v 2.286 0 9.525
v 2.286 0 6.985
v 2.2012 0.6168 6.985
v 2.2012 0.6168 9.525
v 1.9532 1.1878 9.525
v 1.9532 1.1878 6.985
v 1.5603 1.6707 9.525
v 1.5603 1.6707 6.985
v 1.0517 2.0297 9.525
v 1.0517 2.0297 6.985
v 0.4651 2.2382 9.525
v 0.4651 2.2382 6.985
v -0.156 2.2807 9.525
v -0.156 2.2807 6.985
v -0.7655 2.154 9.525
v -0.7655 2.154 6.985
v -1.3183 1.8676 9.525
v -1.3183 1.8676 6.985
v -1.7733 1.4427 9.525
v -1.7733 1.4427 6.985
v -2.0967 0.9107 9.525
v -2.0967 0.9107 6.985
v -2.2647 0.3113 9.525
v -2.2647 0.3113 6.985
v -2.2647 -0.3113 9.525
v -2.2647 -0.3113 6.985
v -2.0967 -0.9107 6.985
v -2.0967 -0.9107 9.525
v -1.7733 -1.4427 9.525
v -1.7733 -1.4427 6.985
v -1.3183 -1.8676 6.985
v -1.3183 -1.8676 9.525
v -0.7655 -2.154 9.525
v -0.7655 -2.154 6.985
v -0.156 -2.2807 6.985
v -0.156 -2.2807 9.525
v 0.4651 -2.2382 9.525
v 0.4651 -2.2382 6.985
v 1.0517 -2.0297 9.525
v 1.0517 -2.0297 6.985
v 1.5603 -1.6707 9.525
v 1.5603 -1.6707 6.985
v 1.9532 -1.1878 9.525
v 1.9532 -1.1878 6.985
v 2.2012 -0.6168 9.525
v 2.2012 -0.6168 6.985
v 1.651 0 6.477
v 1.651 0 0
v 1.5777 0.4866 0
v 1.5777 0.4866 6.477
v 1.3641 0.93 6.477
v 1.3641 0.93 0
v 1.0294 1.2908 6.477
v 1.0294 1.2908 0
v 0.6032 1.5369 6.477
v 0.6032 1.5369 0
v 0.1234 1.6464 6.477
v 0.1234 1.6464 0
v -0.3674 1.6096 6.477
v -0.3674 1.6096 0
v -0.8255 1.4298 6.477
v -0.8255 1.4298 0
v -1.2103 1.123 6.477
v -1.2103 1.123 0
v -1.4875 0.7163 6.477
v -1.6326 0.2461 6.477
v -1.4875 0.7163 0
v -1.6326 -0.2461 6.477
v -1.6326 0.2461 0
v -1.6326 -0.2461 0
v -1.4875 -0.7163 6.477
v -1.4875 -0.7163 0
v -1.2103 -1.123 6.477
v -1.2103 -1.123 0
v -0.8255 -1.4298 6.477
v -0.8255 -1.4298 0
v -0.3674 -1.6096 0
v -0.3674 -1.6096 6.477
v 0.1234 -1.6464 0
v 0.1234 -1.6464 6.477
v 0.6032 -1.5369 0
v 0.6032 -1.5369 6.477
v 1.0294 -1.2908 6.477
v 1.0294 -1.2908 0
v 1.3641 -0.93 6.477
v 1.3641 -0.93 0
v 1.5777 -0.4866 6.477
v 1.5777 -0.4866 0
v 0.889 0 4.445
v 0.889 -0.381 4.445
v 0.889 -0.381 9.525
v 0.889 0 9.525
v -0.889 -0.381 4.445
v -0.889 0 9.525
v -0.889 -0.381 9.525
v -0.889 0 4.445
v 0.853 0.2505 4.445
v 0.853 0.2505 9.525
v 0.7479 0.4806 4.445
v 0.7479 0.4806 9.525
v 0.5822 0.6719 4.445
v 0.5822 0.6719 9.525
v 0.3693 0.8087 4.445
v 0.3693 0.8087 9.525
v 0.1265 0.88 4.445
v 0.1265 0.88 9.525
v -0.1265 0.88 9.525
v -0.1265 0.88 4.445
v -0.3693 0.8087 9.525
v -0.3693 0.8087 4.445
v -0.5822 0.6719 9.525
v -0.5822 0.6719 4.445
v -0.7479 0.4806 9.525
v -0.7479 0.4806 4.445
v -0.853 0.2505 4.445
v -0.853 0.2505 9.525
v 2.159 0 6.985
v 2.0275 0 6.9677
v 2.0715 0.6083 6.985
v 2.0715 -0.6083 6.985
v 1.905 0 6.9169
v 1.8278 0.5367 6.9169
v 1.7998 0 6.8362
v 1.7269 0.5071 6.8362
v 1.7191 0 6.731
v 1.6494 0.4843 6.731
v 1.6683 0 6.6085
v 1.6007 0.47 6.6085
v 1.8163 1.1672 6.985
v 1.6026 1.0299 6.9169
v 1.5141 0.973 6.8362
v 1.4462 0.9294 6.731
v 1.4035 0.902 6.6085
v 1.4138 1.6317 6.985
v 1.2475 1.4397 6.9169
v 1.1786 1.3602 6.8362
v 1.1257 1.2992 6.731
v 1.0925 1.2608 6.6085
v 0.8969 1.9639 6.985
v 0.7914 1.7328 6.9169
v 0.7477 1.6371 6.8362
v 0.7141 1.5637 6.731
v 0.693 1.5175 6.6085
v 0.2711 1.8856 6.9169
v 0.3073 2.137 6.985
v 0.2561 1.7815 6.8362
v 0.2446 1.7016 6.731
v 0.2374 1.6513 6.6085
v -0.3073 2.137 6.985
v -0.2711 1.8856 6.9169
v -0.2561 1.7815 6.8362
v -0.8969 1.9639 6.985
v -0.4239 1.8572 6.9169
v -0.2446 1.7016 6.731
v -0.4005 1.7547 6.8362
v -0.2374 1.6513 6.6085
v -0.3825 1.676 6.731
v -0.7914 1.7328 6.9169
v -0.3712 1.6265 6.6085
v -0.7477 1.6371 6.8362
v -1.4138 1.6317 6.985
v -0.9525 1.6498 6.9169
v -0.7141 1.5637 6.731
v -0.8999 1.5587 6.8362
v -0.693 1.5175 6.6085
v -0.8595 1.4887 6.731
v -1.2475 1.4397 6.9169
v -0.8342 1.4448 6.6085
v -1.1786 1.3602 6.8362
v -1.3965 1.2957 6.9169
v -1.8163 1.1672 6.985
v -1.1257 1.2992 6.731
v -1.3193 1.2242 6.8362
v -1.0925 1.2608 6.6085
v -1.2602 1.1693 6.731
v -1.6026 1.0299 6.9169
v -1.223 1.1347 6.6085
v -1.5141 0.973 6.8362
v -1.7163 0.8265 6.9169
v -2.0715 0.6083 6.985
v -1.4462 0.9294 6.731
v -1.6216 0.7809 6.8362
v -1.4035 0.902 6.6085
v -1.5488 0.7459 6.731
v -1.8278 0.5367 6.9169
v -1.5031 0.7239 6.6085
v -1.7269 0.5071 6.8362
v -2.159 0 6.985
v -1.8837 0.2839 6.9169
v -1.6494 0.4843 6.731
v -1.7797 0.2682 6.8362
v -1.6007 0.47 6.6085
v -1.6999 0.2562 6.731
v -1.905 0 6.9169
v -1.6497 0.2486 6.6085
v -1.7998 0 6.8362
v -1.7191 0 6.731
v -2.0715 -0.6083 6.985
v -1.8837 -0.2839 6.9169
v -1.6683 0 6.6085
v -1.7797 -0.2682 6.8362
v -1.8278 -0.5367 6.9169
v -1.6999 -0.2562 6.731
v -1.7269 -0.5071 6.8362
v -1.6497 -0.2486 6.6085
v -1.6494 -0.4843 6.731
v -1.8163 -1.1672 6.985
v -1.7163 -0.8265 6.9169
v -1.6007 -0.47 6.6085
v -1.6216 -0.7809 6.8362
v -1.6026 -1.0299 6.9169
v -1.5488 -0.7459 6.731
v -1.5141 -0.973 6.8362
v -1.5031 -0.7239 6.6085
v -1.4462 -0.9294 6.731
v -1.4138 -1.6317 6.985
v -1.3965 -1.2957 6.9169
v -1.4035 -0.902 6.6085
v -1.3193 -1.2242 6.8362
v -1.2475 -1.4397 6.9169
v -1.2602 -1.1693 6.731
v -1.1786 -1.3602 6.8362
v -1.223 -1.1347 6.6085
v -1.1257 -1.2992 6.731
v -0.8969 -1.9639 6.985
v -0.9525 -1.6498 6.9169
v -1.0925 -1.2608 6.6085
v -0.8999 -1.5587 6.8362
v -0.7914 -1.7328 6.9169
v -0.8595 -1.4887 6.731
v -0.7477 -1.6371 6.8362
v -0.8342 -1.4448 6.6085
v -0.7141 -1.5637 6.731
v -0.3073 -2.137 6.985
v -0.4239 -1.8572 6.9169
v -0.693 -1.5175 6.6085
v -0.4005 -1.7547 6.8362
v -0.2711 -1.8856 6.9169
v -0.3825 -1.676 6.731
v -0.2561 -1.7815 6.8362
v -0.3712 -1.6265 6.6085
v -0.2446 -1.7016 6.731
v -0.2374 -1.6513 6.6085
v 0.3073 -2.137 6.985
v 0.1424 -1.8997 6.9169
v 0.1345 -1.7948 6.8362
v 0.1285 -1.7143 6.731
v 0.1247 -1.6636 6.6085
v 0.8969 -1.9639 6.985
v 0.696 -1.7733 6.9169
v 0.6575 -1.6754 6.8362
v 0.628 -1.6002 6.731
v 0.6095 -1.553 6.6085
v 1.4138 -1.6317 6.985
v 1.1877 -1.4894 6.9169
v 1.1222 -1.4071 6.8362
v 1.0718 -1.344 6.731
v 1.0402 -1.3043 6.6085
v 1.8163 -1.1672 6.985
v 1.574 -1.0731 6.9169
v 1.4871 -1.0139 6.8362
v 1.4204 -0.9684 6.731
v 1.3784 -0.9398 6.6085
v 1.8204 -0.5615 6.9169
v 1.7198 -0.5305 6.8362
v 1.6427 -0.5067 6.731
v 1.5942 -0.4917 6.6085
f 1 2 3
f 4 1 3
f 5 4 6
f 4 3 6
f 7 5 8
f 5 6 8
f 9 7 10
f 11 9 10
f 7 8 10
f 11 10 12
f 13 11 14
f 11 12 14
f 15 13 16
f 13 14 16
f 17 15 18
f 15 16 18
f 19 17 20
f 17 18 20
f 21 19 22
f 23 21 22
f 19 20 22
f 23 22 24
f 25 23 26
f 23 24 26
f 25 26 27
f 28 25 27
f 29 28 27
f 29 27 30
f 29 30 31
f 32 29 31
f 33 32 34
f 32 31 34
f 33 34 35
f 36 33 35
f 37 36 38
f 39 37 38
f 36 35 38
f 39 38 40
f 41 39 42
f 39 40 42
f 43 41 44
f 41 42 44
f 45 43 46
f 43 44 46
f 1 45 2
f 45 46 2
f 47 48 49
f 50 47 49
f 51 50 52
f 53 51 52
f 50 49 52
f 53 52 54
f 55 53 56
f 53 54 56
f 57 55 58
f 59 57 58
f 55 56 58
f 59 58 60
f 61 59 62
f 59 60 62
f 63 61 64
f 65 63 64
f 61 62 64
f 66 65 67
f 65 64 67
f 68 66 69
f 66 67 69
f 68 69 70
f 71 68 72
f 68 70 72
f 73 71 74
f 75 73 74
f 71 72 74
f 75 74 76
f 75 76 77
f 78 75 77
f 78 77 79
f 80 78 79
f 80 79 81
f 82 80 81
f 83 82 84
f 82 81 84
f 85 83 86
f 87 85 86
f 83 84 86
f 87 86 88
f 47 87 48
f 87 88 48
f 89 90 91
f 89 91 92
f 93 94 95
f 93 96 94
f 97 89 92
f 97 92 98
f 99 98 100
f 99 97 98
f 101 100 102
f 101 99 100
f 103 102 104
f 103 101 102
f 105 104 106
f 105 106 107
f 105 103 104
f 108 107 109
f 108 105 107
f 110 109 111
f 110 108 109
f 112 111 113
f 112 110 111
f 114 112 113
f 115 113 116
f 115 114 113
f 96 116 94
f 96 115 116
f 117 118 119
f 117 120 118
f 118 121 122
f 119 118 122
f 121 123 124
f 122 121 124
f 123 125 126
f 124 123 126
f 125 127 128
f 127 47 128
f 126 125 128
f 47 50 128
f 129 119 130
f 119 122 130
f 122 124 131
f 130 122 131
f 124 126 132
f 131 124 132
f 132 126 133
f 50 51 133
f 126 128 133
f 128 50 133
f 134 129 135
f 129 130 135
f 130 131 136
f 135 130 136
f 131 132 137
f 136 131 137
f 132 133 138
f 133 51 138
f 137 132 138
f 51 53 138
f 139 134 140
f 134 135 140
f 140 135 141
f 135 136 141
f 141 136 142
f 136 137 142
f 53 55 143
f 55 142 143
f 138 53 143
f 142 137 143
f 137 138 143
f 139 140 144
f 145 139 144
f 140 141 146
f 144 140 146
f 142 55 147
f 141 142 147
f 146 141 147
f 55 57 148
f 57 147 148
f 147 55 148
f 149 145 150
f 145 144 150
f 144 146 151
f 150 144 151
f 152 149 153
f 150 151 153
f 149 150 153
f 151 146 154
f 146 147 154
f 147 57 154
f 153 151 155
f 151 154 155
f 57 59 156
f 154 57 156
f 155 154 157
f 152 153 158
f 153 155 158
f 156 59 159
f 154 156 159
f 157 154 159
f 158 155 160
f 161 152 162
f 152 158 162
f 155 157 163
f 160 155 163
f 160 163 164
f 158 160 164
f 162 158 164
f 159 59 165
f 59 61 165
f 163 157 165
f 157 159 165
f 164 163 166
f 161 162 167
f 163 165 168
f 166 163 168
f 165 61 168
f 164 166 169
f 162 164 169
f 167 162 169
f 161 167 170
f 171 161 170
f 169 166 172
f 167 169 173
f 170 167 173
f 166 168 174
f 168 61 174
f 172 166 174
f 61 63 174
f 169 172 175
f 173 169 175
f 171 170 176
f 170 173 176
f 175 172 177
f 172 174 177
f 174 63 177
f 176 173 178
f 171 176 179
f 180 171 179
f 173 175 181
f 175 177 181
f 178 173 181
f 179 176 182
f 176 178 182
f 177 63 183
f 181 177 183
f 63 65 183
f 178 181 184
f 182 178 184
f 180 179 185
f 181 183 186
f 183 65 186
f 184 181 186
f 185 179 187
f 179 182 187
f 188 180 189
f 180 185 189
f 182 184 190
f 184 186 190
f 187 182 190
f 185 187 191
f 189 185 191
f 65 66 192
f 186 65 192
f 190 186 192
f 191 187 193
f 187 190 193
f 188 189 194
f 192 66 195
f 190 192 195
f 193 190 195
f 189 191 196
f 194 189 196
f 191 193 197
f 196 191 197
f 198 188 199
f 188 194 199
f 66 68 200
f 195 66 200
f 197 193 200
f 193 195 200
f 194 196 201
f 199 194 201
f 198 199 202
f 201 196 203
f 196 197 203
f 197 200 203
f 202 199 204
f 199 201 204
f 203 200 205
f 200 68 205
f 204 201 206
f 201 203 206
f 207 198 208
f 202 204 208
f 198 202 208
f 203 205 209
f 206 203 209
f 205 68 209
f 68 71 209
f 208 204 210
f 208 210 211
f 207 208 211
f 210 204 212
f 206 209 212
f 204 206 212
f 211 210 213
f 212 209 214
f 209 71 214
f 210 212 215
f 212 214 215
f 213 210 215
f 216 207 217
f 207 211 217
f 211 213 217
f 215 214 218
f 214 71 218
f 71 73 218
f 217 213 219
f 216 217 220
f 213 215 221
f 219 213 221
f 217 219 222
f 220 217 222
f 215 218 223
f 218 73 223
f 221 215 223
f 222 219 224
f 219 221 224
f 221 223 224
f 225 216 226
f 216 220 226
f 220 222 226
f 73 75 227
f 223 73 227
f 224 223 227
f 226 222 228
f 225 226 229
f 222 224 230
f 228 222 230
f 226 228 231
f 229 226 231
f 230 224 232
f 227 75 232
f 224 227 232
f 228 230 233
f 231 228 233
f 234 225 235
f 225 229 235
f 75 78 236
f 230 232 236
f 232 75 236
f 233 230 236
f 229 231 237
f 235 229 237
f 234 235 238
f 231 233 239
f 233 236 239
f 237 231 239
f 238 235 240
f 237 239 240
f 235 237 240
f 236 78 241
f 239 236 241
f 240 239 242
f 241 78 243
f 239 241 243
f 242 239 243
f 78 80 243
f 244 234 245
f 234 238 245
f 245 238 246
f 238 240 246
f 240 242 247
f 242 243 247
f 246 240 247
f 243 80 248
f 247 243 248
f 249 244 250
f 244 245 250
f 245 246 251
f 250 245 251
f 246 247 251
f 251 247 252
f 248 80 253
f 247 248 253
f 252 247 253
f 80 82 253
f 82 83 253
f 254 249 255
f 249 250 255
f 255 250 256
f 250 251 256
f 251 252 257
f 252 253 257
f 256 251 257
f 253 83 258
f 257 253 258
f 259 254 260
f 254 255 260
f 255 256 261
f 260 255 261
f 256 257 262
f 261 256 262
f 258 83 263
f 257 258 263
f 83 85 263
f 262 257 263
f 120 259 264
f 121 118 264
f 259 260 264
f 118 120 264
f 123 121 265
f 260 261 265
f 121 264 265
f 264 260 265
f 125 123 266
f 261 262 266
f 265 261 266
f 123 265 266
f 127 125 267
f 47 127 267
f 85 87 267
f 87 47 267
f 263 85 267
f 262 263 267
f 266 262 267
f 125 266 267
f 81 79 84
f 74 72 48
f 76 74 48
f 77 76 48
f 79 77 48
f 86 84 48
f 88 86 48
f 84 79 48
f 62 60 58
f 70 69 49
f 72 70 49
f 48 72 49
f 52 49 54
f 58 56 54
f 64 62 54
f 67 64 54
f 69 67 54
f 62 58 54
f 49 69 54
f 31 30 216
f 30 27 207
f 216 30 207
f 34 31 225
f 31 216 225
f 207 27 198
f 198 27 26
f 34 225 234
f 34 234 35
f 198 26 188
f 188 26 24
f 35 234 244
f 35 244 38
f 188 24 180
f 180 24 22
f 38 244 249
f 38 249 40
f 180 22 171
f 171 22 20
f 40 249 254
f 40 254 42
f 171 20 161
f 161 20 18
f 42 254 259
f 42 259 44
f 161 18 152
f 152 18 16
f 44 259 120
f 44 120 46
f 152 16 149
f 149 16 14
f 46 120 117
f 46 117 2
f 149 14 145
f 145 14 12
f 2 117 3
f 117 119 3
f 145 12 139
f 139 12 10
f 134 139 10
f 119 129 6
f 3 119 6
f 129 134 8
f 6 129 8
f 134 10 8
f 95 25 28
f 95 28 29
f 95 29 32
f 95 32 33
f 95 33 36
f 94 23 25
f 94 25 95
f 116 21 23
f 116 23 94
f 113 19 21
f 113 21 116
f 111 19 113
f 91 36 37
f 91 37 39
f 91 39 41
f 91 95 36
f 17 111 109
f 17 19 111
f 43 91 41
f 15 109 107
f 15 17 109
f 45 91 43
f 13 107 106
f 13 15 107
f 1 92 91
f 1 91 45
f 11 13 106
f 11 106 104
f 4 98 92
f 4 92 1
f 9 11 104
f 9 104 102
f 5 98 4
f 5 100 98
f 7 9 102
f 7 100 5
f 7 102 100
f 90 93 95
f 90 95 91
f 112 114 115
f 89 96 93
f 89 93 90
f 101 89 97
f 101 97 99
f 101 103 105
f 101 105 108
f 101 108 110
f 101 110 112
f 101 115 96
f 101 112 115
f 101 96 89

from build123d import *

# Parameters (mm, degrees)
SKETCH1_R               = 1.651
BOSS_EXTRUDE1_DEPTH     = 6.985
SKETCH3_R               = 2.286
BOSS_EXTRUDE2_DEPTH     = 2.54
CUT_EXTRUDE3_DEPTH      = 2.54
CUT_EXTRUDE3_DEPTH_BACK = 2.54
FILLET1_R               = 0.508


with BuildPart() as part:
    # Sketch1 → Boss-Extrude1 (new body)
    with BuildSketch(Plane.XY):
        Circle(SKETCH1_R)
    extrude(amount=BOSS_EXTRUDE1_DEPTH)

    # Sketch3 → Boss-Extrude2 (add)
    with BuildSketch(Plane.XY.offset(6.985)):
        Circle(SKETCH3_R)
    extrude(amount=BOSS_EXTRUDE2_DEPTH)

    # Sketch2 → Cut-Extrude3 (cut, two sides)
    with BuildSketch(Plane.XY.offset(6.985)) as cut_extrude3_sk:
        with BuildLine():
            Line((-0.889, 0), (-0.889, -0.381))
            Line((-0.889, -0.381), (0.7112, -0.381))
            Line((0.7112, -0.381), (0.889, -0.381))
            Line((0.889, -0.381), (0.889, 0))
            ThreePointArc((0.889, 0), (0, 0.889), (-0.889, 0))
        make_face()
    extrude(amount=CUT_EXTRUDE3_DEPTH, mode=Mode.SUBTRACT)
    extrude(cut_extrude3_sk.sketch, amount=-CUT_EXTRUDE3_DEPTH_BACK, mode=Mode.SUBTRACT)

    # Fillet1
    fillet1_edges = [part.edges().sort_by_distance(p)[0] for p in [
        (-1.651, 0, 6.985),
    ]]
    fillet(fillet1_edges, radius=FILLET1_R)


solid = part.part
